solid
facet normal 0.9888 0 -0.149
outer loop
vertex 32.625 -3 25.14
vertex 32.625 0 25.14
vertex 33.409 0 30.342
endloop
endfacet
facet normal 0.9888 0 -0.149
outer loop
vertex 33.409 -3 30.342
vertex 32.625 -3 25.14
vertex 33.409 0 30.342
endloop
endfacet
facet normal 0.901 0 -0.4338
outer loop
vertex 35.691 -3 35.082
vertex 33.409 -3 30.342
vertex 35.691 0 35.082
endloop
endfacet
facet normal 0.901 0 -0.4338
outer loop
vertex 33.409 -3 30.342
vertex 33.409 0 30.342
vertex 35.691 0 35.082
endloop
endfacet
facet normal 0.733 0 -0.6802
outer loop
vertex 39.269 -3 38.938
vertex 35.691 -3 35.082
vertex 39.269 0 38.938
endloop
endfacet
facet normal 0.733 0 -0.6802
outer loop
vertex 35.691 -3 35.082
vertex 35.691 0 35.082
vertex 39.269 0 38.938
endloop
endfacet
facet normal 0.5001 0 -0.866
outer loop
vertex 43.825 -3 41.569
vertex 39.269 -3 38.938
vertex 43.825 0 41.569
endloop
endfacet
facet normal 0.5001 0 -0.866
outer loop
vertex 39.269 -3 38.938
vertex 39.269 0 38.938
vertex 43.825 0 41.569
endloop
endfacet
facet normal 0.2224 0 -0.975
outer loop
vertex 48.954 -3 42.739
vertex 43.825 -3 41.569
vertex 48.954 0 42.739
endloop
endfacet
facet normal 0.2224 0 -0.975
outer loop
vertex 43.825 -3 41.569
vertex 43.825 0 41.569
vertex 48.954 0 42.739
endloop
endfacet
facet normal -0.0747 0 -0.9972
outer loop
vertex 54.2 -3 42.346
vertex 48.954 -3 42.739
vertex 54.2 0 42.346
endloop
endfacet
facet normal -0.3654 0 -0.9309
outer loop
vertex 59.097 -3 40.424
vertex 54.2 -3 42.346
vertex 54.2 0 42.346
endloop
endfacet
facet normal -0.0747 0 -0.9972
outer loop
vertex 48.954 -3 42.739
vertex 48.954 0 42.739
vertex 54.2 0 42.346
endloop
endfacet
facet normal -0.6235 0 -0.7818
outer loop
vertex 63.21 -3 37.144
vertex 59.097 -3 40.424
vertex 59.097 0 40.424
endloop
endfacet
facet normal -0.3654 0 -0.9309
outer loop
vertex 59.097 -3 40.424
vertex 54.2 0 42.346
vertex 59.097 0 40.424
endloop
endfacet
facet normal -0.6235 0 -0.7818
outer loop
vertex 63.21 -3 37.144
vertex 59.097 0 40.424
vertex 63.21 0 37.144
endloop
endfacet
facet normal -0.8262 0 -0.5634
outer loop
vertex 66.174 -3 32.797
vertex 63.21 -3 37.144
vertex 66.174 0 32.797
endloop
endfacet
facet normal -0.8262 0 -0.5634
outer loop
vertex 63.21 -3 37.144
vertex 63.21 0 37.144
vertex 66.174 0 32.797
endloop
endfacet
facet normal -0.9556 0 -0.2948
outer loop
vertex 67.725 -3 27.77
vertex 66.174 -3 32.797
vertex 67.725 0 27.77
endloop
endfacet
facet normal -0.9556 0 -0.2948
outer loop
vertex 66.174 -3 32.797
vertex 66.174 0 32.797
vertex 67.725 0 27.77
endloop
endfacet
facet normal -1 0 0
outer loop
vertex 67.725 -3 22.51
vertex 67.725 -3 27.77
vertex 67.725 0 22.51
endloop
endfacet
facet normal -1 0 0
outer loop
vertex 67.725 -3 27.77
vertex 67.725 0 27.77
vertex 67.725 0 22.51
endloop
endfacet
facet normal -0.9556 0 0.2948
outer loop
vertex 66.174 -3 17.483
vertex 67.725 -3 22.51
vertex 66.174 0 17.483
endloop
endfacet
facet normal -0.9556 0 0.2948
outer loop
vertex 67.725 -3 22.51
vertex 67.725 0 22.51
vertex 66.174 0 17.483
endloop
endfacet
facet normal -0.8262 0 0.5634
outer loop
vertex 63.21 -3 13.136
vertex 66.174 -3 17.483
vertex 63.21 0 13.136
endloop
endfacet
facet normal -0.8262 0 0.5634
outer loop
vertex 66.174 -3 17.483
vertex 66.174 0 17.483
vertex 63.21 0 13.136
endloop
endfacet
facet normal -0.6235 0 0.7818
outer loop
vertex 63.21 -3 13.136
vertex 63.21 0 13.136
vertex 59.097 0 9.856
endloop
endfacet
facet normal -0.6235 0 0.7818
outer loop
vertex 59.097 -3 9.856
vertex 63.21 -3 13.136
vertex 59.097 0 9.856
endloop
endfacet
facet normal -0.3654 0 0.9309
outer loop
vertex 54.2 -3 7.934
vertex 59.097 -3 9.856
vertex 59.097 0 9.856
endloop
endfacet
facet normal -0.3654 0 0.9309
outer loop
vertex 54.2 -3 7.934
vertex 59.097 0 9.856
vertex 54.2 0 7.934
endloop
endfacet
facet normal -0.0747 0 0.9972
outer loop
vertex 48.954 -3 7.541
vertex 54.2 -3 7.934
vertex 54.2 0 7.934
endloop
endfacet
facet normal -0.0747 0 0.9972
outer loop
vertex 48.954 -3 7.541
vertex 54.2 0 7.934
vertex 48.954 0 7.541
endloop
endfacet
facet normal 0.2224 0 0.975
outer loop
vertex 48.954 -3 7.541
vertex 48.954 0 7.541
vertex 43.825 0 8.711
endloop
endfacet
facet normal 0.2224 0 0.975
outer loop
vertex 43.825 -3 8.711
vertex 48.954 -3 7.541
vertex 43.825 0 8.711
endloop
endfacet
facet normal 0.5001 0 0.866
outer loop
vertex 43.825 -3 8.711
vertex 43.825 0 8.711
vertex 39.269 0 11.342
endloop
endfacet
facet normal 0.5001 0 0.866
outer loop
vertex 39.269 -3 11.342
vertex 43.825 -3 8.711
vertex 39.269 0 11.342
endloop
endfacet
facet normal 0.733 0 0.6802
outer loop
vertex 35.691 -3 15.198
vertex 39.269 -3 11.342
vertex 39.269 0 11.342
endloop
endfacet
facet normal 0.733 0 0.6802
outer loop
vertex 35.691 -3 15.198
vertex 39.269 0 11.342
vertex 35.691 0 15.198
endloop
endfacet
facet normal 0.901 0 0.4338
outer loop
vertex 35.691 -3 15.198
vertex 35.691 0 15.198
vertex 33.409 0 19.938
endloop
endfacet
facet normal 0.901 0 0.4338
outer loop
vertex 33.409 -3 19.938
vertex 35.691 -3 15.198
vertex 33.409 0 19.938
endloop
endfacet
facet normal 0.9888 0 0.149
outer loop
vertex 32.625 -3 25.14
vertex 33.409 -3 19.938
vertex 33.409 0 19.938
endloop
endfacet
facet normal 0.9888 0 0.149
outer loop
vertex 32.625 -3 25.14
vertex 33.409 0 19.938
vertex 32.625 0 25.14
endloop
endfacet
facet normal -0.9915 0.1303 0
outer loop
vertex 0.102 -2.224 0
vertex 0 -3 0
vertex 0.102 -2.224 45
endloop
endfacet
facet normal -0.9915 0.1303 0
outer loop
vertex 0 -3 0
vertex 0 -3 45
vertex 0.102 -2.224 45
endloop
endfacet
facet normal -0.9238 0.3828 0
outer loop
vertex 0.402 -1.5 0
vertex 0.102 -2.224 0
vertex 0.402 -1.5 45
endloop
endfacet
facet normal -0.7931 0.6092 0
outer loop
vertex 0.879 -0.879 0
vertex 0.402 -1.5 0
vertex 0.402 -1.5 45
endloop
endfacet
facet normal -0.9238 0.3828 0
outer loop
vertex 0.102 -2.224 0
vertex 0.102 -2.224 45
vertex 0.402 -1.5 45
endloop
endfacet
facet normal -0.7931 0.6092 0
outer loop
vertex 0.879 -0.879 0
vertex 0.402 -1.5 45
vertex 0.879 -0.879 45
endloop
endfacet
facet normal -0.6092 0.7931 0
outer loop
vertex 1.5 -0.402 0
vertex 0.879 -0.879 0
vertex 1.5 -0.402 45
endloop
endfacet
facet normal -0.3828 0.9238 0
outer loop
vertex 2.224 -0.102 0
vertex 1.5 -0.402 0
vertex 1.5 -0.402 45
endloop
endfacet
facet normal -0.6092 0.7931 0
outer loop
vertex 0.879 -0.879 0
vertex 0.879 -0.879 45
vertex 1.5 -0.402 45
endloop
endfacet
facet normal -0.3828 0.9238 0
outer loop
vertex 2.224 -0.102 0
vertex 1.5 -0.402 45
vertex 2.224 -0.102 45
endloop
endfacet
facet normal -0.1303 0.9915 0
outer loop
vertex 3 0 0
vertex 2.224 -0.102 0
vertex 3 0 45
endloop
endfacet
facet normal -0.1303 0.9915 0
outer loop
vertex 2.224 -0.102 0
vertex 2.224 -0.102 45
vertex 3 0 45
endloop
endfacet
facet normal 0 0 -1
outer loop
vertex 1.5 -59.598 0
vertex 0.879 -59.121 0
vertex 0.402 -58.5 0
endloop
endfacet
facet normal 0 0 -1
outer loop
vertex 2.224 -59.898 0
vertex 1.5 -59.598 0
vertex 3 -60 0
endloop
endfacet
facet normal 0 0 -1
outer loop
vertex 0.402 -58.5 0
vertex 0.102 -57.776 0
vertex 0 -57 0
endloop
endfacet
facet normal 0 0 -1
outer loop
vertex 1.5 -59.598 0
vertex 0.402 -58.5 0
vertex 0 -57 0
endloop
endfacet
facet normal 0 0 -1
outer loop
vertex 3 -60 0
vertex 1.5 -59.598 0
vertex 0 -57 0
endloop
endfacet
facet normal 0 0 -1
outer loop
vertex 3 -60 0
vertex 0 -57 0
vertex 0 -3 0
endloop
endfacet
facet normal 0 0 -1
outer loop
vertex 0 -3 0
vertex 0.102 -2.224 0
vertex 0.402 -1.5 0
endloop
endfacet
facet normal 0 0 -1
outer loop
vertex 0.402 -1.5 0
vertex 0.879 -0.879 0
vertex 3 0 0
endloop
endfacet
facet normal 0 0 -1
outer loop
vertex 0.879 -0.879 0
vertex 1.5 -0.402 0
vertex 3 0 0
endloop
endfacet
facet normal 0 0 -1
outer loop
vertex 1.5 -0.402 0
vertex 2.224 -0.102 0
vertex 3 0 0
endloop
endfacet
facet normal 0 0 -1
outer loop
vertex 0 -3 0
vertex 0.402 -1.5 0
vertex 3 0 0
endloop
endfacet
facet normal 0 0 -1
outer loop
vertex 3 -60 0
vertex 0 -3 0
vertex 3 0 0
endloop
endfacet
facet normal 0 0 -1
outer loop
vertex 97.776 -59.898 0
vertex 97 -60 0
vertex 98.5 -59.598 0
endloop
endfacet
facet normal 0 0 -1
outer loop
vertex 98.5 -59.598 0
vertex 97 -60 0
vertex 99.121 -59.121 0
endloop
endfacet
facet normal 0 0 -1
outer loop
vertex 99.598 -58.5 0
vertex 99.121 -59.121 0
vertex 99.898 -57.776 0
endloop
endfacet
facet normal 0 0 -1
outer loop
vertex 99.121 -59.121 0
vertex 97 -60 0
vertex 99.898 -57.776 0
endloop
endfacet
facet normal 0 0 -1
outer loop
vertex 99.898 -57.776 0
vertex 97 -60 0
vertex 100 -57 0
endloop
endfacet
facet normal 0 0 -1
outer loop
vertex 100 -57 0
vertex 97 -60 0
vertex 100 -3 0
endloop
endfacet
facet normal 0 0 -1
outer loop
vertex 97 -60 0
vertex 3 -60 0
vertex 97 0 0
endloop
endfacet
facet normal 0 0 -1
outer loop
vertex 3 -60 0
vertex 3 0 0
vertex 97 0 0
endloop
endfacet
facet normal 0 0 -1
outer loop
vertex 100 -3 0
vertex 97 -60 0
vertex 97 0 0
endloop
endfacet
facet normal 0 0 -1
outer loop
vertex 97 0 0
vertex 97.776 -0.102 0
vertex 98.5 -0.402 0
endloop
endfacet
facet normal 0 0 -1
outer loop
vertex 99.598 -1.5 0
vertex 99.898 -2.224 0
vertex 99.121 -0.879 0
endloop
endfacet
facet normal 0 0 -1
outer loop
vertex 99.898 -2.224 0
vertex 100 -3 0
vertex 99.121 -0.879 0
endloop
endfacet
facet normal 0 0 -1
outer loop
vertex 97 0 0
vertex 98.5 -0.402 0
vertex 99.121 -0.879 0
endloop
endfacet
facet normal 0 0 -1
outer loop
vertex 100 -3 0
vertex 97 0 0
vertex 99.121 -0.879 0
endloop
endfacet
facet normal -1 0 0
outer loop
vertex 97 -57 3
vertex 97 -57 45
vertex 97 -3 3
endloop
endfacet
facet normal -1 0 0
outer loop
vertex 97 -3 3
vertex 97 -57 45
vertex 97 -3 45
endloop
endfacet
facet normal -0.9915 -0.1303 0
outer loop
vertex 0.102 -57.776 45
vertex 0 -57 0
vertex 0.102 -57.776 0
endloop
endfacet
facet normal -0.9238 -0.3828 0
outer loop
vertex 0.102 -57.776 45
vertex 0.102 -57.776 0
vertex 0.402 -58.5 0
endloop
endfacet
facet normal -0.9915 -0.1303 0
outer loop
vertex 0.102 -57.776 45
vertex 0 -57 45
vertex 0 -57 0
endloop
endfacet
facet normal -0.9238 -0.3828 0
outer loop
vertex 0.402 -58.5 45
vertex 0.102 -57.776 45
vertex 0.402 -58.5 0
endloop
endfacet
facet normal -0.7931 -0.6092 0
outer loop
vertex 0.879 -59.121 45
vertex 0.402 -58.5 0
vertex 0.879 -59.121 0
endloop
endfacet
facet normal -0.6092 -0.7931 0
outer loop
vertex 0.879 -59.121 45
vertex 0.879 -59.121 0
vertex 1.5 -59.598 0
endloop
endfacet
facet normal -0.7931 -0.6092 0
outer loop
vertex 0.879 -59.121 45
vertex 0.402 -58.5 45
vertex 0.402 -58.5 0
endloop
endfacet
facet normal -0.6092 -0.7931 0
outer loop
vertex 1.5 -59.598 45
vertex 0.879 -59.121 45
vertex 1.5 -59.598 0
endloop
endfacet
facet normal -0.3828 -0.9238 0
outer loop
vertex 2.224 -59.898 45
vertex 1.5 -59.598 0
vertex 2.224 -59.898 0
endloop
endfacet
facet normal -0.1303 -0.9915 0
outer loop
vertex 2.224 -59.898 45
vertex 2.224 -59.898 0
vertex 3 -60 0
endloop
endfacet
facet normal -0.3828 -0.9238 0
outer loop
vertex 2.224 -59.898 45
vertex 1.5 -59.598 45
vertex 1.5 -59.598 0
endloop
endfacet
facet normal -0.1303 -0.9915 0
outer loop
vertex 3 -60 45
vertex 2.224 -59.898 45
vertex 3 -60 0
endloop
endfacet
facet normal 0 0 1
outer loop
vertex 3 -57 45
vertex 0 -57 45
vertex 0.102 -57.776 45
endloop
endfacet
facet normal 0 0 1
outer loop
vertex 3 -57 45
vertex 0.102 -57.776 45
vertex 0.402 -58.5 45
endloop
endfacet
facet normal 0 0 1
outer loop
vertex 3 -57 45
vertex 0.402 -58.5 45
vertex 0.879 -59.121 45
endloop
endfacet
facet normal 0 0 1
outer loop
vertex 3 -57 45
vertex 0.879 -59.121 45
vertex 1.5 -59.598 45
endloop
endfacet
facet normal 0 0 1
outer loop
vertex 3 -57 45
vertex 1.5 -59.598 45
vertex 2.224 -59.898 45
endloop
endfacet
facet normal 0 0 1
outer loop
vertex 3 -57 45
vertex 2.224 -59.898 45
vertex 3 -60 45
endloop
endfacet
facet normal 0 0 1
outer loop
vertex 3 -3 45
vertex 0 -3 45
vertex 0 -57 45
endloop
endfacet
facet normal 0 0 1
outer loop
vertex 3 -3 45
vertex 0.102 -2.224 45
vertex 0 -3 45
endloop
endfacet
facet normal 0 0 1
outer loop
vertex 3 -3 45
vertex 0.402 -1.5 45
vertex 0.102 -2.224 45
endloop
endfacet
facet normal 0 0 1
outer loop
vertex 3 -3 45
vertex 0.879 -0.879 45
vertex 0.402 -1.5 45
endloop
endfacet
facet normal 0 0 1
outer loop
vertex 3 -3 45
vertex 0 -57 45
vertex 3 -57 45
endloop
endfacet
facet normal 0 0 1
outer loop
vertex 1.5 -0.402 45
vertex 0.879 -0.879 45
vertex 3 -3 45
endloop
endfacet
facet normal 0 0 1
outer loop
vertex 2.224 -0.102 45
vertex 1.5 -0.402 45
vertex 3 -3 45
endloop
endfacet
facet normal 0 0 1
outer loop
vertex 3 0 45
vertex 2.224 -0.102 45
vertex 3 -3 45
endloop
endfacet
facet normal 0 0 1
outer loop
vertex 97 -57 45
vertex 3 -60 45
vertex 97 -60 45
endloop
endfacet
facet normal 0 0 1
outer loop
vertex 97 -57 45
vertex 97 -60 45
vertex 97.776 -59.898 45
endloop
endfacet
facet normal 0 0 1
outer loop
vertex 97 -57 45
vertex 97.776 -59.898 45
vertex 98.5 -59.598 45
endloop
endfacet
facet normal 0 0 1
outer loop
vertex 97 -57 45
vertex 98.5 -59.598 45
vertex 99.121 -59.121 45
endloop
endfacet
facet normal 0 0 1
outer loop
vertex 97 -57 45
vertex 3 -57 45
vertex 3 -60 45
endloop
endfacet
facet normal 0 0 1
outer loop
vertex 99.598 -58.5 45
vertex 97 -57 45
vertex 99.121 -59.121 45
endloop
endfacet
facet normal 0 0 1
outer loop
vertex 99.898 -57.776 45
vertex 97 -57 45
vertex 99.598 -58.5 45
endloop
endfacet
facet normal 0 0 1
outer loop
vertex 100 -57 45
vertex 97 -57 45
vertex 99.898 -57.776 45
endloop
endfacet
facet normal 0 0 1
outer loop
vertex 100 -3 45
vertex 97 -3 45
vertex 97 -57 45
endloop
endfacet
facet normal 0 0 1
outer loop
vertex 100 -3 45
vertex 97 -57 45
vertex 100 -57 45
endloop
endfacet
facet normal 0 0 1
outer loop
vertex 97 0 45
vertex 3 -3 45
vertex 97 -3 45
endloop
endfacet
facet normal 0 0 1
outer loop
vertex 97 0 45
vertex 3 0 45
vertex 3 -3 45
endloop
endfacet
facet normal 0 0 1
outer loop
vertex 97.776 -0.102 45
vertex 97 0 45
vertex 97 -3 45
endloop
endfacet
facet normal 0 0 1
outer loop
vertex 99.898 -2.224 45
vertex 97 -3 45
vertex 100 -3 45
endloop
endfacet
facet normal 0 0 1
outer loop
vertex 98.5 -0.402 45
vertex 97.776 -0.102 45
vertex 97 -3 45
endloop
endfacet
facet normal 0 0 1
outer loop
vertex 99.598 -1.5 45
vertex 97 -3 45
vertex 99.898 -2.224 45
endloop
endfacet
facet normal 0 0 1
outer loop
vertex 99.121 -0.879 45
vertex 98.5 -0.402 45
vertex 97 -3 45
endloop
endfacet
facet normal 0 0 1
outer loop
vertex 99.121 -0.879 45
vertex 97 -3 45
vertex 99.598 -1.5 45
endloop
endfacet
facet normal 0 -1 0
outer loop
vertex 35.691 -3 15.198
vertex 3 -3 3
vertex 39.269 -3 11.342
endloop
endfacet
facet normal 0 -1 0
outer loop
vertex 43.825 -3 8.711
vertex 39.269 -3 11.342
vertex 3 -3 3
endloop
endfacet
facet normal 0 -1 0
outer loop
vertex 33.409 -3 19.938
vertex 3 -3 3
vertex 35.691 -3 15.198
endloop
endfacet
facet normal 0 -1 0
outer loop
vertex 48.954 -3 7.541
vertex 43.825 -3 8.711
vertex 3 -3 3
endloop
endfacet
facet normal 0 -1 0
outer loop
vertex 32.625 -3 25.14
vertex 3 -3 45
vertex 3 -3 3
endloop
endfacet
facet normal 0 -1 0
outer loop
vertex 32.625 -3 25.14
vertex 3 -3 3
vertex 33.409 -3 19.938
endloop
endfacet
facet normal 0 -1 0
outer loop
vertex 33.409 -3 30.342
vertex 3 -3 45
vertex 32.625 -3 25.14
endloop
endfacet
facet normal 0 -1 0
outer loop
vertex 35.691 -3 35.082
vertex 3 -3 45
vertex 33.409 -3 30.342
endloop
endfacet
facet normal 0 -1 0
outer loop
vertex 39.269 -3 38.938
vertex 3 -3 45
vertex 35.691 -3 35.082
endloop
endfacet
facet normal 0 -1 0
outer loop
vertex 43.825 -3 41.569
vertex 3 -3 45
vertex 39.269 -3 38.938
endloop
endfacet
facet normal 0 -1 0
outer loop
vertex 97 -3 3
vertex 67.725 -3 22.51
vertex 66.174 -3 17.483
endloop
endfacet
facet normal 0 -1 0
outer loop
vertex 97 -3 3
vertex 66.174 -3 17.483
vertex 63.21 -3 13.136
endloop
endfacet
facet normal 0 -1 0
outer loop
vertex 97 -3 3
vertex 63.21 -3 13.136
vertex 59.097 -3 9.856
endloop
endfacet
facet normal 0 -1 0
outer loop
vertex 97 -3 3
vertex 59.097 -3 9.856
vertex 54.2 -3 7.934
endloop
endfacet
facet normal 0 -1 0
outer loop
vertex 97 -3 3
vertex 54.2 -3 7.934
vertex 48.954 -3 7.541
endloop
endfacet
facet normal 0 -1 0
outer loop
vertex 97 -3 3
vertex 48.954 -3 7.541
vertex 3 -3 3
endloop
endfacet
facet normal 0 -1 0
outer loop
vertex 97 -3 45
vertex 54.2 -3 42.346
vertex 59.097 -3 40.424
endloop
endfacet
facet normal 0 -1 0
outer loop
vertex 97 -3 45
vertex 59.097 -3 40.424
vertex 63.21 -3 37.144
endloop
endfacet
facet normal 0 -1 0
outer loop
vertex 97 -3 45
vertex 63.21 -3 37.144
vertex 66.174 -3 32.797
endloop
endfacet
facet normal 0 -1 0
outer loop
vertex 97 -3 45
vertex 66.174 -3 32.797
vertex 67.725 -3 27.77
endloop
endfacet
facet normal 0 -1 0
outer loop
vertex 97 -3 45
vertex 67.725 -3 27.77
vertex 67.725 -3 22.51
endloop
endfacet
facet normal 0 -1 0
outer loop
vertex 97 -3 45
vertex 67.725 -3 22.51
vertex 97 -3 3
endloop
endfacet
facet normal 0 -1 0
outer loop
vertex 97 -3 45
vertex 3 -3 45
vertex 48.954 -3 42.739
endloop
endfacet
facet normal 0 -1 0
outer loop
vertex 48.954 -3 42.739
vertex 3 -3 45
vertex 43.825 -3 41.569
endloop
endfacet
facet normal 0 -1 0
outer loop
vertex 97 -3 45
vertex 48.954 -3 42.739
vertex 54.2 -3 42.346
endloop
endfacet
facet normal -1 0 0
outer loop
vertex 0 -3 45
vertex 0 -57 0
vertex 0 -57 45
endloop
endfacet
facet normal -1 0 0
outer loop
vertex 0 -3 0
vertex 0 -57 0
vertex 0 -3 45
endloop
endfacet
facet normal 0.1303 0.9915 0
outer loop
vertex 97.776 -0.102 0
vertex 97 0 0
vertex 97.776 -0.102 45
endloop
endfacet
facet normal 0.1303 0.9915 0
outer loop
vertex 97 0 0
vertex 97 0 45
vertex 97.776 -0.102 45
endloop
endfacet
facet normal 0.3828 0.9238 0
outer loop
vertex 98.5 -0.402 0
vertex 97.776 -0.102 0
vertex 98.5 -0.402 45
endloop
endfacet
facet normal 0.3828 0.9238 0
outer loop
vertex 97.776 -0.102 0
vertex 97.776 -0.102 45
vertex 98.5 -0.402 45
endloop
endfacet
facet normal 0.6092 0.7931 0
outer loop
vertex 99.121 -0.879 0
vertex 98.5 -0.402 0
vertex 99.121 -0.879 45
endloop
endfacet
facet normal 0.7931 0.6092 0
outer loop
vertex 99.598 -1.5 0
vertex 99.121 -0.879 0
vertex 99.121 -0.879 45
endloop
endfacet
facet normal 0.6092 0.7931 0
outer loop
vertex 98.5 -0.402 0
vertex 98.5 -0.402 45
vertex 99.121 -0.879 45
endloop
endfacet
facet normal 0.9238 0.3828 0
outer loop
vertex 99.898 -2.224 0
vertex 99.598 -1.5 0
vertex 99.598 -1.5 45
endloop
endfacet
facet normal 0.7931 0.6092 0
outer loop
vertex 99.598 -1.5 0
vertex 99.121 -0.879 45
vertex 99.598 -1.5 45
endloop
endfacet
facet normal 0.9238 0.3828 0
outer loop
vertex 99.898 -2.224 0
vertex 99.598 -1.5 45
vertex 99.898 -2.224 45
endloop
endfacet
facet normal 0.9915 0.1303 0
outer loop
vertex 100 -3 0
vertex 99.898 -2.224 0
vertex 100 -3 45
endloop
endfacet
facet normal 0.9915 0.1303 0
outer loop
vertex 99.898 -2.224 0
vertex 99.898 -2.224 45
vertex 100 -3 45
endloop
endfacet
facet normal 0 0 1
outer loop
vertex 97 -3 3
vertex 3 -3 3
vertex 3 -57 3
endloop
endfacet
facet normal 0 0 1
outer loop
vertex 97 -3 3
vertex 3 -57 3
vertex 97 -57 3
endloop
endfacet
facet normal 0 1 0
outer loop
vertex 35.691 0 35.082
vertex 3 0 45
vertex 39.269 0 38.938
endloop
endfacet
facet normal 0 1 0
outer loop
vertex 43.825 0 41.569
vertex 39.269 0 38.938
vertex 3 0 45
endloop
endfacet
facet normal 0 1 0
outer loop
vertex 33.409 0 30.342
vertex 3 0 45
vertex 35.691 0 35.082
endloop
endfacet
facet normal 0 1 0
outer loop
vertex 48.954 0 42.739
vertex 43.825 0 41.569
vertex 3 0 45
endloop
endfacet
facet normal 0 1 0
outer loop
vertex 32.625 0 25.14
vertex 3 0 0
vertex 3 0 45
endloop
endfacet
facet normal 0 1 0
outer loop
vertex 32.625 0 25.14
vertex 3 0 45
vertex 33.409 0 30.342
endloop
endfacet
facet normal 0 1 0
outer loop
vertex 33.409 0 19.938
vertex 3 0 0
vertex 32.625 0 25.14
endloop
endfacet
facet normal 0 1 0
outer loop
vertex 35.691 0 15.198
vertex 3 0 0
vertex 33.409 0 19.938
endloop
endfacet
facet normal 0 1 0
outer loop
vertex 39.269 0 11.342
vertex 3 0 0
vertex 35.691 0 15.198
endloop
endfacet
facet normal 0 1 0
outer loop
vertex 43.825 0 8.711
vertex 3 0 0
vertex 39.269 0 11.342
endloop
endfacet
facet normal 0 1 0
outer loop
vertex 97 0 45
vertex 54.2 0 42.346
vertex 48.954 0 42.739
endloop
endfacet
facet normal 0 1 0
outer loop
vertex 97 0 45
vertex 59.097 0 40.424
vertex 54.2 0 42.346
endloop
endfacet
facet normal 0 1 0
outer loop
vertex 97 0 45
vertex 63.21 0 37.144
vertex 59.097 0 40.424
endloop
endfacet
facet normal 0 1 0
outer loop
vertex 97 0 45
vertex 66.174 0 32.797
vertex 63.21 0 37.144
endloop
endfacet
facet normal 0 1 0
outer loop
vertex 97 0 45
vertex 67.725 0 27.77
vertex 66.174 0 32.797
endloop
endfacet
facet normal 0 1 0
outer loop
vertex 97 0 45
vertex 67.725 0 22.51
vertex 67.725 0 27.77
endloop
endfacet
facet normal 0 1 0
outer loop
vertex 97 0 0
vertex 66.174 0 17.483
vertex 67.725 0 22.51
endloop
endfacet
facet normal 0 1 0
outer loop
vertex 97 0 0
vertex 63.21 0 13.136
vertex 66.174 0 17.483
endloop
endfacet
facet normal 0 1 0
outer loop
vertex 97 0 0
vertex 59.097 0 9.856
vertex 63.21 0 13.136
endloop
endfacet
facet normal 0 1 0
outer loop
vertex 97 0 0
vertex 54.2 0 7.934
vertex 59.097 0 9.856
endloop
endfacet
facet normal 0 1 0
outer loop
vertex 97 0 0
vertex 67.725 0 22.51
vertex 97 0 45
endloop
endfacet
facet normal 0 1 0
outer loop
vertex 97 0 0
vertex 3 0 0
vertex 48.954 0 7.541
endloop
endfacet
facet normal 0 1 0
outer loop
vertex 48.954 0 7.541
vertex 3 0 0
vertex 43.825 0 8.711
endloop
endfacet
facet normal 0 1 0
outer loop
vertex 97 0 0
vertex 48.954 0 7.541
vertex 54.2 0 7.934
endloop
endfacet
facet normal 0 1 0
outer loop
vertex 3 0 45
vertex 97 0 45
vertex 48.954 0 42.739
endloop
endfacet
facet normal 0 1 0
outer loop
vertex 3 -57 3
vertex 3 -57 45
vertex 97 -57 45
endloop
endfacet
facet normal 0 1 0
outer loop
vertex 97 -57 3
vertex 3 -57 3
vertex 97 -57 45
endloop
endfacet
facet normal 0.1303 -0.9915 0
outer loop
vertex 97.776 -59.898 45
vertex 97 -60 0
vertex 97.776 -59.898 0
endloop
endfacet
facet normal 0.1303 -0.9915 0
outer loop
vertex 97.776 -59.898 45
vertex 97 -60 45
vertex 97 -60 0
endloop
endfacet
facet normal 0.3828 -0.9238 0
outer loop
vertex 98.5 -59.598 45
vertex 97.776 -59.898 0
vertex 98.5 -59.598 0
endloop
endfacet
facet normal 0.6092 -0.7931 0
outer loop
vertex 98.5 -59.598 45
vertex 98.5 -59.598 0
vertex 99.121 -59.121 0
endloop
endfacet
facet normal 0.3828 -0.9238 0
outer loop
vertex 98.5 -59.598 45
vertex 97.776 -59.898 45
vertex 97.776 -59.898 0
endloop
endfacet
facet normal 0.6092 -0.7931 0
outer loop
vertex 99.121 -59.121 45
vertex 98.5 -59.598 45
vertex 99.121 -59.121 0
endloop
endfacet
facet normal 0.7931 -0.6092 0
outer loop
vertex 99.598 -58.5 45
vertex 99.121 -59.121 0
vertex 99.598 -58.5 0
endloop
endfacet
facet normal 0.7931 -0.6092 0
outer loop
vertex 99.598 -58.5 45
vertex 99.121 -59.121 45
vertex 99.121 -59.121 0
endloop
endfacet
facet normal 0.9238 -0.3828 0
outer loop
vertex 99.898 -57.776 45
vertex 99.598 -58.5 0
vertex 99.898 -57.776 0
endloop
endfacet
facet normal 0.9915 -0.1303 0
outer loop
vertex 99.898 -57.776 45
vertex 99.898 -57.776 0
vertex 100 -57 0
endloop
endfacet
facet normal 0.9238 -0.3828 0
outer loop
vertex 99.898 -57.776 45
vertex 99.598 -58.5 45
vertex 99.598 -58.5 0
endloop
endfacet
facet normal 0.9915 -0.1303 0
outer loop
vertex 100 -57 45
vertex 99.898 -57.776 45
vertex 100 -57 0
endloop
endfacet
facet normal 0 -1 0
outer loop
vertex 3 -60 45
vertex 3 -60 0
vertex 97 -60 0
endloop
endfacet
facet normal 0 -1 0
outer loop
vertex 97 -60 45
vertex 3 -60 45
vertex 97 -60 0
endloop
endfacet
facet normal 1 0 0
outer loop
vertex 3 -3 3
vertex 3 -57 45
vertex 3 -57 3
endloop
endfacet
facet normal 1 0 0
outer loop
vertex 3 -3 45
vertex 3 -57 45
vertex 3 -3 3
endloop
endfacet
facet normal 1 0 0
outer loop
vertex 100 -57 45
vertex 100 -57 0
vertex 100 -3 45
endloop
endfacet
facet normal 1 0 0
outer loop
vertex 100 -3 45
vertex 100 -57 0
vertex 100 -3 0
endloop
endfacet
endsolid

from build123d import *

# Parameters (mm, degrees)
F0_W     = 100
F0_H     = 60
F1_DEPTH = 45
F2_W     = 94
F2_H     = 54
F3_DEPTH = 42
F4_R     = 3
F5_R     = 17.648561216
F6_DEPTH = 25


with BuildPart() as f1:
    # F0 (on Top) → F1 (new body)
    with BuildSketch(Plane.XY):
        with Locations((50, -30)):
            Rectangle(F0_W, F0_H)
    extrude(amount=F1_DEPTH)

    # F2 (on face) → F3 (cut, through all)
    with BuildSketch(Plane.XY.offset(45)):
        with Locations((50, -30)):
            Rectangle(F2_W, F2_H)
    extrude(amount=-F3_DEPTH, mode=Mode.SUBTRACT)

    # F4
    f4_edges = [f1.edges().sort_by_distance(p)[0] for p in [
        (100, -60, 22.5),
        (100, 0, 22.5),
        (0, 0, 22.5),
        (0, -60, 22.5),
    ]]
    fillet(f4_edges, radius=F4_R)

    # F5 (on face) → F6 (cut)
    with BuildSketch(Plane(origin=(0, 0, 0), x_dir=(-1, 0, 0), z_dir=(0, 1, 0))):
        with Locations((-50.2731017768, 25.1400116831)):
            Circle(F5_R)
    extrude(amount=-F6_DEPTH, mode=Mode.SUBTRACT)


solid = f1.part
